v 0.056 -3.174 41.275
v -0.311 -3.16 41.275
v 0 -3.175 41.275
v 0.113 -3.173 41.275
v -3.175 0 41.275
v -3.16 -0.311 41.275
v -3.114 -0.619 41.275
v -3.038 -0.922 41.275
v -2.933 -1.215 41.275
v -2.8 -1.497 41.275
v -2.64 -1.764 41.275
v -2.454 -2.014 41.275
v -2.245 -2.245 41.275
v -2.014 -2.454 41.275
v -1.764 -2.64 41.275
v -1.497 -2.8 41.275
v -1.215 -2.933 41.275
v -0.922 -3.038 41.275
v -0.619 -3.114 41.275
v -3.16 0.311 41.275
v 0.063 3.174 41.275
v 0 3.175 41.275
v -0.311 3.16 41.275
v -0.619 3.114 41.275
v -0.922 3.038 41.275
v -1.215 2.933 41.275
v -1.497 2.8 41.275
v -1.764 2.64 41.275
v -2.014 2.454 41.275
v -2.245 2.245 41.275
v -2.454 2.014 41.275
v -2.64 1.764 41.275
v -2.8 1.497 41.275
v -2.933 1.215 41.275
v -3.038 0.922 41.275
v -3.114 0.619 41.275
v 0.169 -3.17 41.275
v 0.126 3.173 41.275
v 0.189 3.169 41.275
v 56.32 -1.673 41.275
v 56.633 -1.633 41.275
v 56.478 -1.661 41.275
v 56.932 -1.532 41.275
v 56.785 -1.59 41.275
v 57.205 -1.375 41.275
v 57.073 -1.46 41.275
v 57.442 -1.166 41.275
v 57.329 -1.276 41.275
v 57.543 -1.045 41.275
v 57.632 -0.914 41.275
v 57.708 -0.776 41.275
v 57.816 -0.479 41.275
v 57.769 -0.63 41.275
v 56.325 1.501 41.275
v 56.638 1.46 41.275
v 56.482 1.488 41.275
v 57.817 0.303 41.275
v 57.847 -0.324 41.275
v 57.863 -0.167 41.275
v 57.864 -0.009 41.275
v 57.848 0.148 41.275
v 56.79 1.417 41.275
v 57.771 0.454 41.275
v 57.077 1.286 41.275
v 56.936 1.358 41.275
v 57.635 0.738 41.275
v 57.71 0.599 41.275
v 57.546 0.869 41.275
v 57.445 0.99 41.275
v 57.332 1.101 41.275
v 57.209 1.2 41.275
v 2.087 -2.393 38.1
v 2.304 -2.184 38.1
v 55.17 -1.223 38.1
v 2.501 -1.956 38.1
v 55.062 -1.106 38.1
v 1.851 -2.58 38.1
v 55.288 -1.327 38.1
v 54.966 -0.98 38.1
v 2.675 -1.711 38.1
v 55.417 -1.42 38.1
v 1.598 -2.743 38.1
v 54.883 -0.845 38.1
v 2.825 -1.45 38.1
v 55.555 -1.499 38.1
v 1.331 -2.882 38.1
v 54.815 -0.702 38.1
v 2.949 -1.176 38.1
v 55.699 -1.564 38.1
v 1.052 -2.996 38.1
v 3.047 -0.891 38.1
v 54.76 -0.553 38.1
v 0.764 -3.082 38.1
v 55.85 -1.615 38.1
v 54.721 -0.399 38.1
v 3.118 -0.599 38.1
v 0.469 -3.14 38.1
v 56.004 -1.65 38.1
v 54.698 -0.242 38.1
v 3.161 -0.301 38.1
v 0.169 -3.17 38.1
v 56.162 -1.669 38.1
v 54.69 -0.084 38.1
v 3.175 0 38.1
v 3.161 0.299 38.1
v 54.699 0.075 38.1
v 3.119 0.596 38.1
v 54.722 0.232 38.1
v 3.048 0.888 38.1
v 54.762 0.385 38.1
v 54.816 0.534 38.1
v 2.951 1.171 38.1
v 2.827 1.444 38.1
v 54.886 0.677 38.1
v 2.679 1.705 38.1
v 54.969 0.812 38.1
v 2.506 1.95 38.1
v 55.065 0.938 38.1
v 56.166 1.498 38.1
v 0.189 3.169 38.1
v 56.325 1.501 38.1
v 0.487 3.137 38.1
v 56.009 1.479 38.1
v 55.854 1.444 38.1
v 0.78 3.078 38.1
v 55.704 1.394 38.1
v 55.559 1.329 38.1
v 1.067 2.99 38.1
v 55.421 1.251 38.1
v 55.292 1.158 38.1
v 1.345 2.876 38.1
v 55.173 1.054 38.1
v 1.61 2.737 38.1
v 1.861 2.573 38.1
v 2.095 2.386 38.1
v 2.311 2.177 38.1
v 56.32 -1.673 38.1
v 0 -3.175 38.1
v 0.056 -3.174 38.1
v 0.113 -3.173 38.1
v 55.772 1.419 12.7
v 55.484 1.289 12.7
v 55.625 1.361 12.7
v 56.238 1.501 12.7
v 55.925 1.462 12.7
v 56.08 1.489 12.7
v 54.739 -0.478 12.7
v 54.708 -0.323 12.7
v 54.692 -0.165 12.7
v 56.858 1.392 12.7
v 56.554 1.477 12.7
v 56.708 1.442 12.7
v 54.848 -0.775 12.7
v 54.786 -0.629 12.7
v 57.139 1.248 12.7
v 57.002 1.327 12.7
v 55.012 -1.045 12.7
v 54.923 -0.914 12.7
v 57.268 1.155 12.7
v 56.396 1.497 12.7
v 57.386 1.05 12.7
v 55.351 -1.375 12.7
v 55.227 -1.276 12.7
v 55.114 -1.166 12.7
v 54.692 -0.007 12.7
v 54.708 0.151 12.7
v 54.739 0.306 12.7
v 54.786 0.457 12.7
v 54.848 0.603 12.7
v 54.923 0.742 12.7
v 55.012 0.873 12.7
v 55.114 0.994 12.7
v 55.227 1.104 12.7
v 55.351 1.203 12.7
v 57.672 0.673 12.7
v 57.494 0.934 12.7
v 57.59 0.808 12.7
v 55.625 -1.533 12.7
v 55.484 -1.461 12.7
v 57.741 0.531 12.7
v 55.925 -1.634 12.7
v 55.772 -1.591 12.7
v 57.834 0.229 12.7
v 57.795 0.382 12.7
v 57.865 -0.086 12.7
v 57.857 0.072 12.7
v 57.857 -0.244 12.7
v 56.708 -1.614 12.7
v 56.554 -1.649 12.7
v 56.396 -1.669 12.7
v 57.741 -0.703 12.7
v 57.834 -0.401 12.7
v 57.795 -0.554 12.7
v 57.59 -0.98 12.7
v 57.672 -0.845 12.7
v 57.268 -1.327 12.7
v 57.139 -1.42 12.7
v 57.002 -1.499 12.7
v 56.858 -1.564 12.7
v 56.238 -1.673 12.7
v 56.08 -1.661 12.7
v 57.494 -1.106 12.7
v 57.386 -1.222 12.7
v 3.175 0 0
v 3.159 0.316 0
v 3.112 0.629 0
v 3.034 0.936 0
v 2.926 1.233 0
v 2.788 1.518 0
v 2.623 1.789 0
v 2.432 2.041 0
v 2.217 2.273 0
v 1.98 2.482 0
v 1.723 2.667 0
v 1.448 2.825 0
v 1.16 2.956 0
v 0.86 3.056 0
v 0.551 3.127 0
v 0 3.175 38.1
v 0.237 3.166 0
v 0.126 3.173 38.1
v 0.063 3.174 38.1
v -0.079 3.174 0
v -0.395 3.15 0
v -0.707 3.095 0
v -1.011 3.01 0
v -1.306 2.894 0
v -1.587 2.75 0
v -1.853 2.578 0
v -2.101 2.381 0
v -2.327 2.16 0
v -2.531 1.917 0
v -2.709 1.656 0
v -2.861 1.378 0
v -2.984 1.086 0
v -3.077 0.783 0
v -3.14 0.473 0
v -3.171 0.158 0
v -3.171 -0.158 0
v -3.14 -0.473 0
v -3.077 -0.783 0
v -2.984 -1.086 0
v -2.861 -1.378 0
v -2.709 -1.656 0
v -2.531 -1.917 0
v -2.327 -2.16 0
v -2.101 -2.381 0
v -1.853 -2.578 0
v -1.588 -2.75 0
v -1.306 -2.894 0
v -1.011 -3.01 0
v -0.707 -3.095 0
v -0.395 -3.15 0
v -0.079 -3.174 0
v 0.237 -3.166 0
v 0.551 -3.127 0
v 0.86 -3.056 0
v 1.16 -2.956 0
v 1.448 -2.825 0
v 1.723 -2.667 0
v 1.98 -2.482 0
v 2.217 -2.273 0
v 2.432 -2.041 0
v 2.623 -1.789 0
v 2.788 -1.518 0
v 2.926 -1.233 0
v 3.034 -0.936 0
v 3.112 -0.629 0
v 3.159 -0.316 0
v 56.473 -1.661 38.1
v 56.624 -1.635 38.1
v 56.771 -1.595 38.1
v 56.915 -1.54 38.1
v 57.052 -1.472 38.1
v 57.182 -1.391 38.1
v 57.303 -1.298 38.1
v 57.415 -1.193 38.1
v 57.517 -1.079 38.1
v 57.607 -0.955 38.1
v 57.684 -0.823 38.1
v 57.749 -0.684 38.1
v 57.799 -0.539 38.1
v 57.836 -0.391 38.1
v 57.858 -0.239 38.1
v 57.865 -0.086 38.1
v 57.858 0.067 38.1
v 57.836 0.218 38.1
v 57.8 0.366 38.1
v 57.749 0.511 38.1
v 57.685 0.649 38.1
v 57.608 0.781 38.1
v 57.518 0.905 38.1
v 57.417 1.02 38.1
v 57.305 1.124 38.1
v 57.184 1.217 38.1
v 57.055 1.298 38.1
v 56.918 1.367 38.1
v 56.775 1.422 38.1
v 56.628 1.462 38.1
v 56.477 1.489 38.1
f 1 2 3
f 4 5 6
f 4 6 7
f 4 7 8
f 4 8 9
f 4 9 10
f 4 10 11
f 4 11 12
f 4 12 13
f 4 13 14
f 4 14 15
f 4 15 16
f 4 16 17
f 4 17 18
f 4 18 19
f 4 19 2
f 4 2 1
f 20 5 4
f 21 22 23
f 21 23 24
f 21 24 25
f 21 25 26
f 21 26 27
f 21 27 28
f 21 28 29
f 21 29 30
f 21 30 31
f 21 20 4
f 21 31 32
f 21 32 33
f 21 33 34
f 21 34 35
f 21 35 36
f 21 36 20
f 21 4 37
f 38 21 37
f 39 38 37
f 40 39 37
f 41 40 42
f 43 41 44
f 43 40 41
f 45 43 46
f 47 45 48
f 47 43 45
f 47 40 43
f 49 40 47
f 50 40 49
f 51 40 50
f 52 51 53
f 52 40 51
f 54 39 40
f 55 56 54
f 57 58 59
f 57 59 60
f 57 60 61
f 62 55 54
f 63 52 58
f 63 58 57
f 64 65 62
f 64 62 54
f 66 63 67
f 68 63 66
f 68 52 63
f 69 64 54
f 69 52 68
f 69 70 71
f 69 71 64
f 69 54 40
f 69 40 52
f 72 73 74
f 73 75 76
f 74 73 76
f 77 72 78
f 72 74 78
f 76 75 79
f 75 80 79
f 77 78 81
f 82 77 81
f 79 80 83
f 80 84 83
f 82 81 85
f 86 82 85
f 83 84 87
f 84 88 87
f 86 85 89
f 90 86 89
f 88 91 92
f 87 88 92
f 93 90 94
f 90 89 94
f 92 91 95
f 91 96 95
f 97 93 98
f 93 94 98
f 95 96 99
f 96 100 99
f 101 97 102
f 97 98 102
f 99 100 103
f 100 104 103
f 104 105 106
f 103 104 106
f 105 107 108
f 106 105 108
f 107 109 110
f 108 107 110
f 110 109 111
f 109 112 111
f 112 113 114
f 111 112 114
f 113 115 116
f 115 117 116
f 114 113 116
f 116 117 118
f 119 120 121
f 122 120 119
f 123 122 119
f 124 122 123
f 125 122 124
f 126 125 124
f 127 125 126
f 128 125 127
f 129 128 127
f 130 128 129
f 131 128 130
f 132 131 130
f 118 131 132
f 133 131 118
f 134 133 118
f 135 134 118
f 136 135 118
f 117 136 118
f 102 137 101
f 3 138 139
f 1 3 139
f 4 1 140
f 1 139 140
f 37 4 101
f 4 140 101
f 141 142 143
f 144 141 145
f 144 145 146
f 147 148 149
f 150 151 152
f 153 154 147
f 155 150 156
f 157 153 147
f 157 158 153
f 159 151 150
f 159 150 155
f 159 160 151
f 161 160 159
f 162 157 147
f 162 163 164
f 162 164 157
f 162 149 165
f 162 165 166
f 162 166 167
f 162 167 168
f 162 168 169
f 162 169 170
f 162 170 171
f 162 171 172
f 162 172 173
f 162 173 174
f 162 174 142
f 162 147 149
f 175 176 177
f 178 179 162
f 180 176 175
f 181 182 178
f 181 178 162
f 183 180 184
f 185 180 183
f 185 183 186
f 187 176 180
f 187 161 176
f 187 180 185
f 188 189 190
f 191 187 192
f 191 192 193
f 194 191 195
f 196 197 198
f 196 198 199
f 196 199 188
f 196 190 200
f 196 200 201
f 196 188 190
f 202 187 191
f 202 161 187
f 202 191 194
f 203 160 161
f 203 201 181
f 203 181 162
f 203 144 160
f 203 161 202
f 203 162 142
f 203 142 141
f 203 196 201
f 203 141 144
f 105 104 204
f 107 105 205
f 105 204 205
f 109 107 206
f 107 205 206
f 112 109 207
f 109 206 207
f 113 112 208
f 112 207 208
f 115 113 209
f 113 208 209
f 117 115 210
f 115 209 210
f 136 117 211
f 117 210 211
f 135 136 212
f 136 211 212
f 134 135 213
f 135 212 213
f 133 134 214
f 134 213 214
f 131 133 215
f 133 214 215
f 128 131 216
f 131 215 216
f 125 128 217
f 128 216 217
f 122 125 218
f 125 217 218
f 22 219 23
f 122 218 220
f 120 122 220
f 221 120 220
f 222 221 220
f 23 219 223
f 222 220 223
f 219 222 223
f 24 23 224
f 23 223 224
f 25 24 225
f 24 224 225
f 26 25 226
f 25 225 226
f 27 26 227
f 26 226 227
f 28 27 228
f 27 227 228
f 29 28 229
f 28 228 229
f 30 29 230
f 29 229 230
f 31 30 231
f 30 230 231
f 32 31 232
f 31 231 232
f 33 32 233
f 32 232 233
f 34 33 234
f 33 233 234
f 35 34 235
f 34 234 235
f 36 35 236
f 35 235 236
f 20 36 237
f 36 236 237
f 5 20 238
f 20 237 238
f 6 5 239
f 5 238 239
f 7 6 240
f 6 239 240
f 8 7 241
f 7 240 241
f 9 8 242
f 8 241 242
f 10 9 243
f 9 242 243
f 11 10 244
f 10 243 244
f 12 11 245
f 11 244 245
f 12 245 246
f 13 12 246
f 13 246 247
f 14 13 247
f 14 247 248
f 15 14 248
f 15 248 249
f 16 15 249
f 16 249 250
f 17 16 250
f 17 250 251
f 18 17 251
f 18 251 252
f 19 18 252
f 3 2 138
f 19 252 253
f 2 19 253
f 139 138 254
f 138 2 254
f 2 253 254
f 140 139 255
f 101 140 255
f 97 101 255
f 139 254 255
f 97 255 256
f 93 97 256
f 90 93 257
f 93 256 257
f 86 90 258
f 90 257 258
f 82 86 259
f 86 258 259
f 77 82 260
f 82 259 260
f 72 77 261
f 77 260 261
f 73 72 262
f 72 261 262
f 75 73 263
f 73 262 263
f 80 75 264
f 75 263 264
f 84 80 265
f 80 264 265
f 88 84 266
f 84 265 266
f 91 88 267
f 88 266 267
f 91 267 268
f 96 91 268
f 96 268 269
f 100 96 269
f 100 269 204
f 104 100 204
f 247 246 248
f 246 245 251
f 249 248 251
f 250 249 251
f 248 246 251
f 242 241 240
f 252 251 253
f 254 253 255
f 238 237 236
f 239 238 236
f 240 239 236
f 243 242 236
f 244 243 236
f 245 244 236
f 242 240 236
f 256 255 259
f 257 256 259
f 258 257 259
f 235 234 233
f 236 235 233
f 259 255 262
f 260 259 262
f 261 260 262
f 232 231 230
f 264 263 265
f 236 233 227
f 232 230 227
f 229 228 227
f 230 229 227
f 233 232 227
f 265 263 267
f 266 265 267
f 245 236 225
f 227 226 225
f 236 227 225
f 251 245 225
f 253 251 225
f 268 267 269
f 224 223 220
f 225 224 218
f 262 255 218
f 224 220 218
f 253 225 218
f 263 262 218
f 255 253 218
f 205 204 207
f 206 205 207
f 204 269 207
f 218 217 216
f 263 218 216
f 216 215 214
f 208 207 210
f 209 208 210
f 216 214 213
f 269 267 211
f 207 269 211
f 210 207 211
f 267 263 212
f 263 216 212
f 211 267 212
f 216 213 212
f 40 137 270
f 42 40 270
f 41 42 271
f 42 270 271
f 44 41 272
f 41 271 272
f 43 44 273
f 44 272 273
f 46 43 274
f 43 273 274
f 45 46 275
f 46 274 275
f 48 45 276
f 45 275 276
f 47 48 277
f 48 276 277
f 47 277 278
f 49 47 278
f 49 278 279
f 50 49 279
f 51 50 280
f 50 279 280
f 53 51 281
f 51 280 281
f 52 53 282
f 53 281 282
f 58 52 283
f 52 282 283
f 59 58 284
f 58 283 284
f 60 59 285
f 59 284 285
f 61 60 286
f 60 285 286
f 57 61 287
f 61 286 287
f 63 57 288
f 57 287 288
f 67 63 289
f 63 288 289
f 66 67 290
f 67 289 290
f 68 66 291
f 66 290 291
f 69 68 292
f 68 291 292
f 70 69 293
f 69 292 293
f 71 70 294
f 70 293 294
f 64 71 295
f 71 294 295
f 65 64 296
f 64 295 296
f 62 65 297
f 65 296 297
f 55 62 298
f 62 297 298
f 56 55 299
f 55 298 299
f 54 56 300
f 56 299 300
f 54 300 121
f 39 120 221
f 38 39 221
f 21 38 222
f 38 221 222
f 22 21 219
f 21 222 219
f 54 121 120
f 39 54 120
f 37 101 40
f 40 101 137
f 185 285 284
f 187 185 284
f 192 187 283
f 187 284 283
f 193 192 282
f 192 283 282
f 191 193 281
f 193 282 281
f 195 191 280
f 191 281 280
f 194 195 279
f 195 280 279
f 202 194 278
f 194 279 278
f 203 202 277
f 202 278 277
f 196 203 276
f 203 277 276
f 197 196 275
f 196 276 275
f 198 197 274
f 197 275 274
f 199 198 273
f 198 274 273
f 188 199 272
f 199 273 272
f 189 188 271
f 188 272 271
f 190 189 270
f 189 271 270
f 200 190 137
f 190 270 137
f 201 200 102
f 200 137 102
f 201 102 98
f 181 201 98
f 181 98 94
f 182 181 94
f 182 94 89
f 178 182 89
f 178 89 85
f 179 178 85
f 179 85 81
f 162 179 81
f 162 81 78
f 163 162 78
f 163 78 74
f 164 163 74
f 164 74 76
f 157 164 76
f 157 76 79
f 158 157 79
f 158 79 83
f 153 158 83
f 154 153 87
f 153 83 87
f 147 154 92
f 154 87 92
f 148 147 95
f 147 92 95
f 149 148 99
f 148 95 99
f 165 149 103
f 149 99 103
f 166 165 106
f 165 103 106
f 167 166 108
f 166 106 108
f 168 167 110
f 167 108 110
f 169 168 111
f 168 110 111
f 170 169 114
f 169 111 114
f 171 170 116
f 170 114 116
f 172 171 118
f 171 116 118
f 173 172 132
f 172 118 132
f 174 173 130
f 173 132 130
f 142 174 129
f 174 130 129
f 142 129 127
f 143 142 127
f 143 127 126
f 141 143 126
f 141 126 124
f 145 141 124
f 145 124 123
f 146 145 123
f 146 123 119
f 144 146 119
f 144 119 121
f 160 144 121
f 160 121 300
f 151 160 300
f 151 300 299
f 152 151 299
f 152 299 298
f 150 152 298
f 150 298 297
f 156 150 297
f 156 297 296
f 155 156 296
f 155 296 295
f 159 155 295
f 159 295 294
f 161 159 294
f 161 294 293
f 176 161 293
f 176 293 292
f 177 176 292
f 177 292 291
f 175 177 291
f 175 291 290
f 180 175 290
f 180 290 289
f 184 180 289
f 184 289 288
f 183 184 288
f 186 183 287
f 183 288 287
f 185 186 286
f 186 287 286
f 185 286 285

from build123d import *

# Parameters (mm, degrees)
F0_R     = 3.175
F1_DEPTH = 38.1
F3_DEPTH = 3.175
F4_R     = 1.5875
F5_DEPTH = 25.4


with BuildPart() as f1:
    # F0 (on Top) → F1 (new body)
    with BuildSketch(Plane.XY):
        Circle(F0_R)
    extrude(amount=F1_DEPTH)

    # F2 (on face) → F3 (join)
    with BuildSketch(Plane.XY.offset(38.1)):
        with BuildLine():
            Line((0, 3.175), (0.188579, 3.169395))
            ThreePointArc((0.188579, 3.169395), (0.094331, 3.173598), (0, 3.175))
        make_face()
        with BuildLine():
            Line((56.325018, 1.500813), (0.188579, 3.169395))
            Line((0.188579, 3.169395), (0, 3.175))
            ThreePointArc((0, 3.175), (-3.175, 0), (0, -3.175))
            Line((0, -3.175), (0.169236, -3.170486))
            Line((0.169236, -3.170486), (56.320177, -1.672922))
            ThreePointArc((56.320177, -1.672922), (57.865351, -0.088408), (56.325018, 1.500813))
        make_face()
        with BuildLine():
            Line((0.169236, -3.170486), (0, -3.175))
            ThreePointArc((0, -3.175), (0.084648, -3.173871), (0.169236, -3.170486))
        make_face()
    extrude(amount=F3_DEPTH)

    # F4 (on face) → F5 (join)
    with BuildSketch(Plane(origin=(0, 0, 38.1), x_dir=(1, 0, 0), z_dir=(0, 0, -1))):
        with Locations((56.277853, 0.085986)):
            Circle(F4_R)
    extrude(amount=F5_DEPTH)


solid = f1.part
